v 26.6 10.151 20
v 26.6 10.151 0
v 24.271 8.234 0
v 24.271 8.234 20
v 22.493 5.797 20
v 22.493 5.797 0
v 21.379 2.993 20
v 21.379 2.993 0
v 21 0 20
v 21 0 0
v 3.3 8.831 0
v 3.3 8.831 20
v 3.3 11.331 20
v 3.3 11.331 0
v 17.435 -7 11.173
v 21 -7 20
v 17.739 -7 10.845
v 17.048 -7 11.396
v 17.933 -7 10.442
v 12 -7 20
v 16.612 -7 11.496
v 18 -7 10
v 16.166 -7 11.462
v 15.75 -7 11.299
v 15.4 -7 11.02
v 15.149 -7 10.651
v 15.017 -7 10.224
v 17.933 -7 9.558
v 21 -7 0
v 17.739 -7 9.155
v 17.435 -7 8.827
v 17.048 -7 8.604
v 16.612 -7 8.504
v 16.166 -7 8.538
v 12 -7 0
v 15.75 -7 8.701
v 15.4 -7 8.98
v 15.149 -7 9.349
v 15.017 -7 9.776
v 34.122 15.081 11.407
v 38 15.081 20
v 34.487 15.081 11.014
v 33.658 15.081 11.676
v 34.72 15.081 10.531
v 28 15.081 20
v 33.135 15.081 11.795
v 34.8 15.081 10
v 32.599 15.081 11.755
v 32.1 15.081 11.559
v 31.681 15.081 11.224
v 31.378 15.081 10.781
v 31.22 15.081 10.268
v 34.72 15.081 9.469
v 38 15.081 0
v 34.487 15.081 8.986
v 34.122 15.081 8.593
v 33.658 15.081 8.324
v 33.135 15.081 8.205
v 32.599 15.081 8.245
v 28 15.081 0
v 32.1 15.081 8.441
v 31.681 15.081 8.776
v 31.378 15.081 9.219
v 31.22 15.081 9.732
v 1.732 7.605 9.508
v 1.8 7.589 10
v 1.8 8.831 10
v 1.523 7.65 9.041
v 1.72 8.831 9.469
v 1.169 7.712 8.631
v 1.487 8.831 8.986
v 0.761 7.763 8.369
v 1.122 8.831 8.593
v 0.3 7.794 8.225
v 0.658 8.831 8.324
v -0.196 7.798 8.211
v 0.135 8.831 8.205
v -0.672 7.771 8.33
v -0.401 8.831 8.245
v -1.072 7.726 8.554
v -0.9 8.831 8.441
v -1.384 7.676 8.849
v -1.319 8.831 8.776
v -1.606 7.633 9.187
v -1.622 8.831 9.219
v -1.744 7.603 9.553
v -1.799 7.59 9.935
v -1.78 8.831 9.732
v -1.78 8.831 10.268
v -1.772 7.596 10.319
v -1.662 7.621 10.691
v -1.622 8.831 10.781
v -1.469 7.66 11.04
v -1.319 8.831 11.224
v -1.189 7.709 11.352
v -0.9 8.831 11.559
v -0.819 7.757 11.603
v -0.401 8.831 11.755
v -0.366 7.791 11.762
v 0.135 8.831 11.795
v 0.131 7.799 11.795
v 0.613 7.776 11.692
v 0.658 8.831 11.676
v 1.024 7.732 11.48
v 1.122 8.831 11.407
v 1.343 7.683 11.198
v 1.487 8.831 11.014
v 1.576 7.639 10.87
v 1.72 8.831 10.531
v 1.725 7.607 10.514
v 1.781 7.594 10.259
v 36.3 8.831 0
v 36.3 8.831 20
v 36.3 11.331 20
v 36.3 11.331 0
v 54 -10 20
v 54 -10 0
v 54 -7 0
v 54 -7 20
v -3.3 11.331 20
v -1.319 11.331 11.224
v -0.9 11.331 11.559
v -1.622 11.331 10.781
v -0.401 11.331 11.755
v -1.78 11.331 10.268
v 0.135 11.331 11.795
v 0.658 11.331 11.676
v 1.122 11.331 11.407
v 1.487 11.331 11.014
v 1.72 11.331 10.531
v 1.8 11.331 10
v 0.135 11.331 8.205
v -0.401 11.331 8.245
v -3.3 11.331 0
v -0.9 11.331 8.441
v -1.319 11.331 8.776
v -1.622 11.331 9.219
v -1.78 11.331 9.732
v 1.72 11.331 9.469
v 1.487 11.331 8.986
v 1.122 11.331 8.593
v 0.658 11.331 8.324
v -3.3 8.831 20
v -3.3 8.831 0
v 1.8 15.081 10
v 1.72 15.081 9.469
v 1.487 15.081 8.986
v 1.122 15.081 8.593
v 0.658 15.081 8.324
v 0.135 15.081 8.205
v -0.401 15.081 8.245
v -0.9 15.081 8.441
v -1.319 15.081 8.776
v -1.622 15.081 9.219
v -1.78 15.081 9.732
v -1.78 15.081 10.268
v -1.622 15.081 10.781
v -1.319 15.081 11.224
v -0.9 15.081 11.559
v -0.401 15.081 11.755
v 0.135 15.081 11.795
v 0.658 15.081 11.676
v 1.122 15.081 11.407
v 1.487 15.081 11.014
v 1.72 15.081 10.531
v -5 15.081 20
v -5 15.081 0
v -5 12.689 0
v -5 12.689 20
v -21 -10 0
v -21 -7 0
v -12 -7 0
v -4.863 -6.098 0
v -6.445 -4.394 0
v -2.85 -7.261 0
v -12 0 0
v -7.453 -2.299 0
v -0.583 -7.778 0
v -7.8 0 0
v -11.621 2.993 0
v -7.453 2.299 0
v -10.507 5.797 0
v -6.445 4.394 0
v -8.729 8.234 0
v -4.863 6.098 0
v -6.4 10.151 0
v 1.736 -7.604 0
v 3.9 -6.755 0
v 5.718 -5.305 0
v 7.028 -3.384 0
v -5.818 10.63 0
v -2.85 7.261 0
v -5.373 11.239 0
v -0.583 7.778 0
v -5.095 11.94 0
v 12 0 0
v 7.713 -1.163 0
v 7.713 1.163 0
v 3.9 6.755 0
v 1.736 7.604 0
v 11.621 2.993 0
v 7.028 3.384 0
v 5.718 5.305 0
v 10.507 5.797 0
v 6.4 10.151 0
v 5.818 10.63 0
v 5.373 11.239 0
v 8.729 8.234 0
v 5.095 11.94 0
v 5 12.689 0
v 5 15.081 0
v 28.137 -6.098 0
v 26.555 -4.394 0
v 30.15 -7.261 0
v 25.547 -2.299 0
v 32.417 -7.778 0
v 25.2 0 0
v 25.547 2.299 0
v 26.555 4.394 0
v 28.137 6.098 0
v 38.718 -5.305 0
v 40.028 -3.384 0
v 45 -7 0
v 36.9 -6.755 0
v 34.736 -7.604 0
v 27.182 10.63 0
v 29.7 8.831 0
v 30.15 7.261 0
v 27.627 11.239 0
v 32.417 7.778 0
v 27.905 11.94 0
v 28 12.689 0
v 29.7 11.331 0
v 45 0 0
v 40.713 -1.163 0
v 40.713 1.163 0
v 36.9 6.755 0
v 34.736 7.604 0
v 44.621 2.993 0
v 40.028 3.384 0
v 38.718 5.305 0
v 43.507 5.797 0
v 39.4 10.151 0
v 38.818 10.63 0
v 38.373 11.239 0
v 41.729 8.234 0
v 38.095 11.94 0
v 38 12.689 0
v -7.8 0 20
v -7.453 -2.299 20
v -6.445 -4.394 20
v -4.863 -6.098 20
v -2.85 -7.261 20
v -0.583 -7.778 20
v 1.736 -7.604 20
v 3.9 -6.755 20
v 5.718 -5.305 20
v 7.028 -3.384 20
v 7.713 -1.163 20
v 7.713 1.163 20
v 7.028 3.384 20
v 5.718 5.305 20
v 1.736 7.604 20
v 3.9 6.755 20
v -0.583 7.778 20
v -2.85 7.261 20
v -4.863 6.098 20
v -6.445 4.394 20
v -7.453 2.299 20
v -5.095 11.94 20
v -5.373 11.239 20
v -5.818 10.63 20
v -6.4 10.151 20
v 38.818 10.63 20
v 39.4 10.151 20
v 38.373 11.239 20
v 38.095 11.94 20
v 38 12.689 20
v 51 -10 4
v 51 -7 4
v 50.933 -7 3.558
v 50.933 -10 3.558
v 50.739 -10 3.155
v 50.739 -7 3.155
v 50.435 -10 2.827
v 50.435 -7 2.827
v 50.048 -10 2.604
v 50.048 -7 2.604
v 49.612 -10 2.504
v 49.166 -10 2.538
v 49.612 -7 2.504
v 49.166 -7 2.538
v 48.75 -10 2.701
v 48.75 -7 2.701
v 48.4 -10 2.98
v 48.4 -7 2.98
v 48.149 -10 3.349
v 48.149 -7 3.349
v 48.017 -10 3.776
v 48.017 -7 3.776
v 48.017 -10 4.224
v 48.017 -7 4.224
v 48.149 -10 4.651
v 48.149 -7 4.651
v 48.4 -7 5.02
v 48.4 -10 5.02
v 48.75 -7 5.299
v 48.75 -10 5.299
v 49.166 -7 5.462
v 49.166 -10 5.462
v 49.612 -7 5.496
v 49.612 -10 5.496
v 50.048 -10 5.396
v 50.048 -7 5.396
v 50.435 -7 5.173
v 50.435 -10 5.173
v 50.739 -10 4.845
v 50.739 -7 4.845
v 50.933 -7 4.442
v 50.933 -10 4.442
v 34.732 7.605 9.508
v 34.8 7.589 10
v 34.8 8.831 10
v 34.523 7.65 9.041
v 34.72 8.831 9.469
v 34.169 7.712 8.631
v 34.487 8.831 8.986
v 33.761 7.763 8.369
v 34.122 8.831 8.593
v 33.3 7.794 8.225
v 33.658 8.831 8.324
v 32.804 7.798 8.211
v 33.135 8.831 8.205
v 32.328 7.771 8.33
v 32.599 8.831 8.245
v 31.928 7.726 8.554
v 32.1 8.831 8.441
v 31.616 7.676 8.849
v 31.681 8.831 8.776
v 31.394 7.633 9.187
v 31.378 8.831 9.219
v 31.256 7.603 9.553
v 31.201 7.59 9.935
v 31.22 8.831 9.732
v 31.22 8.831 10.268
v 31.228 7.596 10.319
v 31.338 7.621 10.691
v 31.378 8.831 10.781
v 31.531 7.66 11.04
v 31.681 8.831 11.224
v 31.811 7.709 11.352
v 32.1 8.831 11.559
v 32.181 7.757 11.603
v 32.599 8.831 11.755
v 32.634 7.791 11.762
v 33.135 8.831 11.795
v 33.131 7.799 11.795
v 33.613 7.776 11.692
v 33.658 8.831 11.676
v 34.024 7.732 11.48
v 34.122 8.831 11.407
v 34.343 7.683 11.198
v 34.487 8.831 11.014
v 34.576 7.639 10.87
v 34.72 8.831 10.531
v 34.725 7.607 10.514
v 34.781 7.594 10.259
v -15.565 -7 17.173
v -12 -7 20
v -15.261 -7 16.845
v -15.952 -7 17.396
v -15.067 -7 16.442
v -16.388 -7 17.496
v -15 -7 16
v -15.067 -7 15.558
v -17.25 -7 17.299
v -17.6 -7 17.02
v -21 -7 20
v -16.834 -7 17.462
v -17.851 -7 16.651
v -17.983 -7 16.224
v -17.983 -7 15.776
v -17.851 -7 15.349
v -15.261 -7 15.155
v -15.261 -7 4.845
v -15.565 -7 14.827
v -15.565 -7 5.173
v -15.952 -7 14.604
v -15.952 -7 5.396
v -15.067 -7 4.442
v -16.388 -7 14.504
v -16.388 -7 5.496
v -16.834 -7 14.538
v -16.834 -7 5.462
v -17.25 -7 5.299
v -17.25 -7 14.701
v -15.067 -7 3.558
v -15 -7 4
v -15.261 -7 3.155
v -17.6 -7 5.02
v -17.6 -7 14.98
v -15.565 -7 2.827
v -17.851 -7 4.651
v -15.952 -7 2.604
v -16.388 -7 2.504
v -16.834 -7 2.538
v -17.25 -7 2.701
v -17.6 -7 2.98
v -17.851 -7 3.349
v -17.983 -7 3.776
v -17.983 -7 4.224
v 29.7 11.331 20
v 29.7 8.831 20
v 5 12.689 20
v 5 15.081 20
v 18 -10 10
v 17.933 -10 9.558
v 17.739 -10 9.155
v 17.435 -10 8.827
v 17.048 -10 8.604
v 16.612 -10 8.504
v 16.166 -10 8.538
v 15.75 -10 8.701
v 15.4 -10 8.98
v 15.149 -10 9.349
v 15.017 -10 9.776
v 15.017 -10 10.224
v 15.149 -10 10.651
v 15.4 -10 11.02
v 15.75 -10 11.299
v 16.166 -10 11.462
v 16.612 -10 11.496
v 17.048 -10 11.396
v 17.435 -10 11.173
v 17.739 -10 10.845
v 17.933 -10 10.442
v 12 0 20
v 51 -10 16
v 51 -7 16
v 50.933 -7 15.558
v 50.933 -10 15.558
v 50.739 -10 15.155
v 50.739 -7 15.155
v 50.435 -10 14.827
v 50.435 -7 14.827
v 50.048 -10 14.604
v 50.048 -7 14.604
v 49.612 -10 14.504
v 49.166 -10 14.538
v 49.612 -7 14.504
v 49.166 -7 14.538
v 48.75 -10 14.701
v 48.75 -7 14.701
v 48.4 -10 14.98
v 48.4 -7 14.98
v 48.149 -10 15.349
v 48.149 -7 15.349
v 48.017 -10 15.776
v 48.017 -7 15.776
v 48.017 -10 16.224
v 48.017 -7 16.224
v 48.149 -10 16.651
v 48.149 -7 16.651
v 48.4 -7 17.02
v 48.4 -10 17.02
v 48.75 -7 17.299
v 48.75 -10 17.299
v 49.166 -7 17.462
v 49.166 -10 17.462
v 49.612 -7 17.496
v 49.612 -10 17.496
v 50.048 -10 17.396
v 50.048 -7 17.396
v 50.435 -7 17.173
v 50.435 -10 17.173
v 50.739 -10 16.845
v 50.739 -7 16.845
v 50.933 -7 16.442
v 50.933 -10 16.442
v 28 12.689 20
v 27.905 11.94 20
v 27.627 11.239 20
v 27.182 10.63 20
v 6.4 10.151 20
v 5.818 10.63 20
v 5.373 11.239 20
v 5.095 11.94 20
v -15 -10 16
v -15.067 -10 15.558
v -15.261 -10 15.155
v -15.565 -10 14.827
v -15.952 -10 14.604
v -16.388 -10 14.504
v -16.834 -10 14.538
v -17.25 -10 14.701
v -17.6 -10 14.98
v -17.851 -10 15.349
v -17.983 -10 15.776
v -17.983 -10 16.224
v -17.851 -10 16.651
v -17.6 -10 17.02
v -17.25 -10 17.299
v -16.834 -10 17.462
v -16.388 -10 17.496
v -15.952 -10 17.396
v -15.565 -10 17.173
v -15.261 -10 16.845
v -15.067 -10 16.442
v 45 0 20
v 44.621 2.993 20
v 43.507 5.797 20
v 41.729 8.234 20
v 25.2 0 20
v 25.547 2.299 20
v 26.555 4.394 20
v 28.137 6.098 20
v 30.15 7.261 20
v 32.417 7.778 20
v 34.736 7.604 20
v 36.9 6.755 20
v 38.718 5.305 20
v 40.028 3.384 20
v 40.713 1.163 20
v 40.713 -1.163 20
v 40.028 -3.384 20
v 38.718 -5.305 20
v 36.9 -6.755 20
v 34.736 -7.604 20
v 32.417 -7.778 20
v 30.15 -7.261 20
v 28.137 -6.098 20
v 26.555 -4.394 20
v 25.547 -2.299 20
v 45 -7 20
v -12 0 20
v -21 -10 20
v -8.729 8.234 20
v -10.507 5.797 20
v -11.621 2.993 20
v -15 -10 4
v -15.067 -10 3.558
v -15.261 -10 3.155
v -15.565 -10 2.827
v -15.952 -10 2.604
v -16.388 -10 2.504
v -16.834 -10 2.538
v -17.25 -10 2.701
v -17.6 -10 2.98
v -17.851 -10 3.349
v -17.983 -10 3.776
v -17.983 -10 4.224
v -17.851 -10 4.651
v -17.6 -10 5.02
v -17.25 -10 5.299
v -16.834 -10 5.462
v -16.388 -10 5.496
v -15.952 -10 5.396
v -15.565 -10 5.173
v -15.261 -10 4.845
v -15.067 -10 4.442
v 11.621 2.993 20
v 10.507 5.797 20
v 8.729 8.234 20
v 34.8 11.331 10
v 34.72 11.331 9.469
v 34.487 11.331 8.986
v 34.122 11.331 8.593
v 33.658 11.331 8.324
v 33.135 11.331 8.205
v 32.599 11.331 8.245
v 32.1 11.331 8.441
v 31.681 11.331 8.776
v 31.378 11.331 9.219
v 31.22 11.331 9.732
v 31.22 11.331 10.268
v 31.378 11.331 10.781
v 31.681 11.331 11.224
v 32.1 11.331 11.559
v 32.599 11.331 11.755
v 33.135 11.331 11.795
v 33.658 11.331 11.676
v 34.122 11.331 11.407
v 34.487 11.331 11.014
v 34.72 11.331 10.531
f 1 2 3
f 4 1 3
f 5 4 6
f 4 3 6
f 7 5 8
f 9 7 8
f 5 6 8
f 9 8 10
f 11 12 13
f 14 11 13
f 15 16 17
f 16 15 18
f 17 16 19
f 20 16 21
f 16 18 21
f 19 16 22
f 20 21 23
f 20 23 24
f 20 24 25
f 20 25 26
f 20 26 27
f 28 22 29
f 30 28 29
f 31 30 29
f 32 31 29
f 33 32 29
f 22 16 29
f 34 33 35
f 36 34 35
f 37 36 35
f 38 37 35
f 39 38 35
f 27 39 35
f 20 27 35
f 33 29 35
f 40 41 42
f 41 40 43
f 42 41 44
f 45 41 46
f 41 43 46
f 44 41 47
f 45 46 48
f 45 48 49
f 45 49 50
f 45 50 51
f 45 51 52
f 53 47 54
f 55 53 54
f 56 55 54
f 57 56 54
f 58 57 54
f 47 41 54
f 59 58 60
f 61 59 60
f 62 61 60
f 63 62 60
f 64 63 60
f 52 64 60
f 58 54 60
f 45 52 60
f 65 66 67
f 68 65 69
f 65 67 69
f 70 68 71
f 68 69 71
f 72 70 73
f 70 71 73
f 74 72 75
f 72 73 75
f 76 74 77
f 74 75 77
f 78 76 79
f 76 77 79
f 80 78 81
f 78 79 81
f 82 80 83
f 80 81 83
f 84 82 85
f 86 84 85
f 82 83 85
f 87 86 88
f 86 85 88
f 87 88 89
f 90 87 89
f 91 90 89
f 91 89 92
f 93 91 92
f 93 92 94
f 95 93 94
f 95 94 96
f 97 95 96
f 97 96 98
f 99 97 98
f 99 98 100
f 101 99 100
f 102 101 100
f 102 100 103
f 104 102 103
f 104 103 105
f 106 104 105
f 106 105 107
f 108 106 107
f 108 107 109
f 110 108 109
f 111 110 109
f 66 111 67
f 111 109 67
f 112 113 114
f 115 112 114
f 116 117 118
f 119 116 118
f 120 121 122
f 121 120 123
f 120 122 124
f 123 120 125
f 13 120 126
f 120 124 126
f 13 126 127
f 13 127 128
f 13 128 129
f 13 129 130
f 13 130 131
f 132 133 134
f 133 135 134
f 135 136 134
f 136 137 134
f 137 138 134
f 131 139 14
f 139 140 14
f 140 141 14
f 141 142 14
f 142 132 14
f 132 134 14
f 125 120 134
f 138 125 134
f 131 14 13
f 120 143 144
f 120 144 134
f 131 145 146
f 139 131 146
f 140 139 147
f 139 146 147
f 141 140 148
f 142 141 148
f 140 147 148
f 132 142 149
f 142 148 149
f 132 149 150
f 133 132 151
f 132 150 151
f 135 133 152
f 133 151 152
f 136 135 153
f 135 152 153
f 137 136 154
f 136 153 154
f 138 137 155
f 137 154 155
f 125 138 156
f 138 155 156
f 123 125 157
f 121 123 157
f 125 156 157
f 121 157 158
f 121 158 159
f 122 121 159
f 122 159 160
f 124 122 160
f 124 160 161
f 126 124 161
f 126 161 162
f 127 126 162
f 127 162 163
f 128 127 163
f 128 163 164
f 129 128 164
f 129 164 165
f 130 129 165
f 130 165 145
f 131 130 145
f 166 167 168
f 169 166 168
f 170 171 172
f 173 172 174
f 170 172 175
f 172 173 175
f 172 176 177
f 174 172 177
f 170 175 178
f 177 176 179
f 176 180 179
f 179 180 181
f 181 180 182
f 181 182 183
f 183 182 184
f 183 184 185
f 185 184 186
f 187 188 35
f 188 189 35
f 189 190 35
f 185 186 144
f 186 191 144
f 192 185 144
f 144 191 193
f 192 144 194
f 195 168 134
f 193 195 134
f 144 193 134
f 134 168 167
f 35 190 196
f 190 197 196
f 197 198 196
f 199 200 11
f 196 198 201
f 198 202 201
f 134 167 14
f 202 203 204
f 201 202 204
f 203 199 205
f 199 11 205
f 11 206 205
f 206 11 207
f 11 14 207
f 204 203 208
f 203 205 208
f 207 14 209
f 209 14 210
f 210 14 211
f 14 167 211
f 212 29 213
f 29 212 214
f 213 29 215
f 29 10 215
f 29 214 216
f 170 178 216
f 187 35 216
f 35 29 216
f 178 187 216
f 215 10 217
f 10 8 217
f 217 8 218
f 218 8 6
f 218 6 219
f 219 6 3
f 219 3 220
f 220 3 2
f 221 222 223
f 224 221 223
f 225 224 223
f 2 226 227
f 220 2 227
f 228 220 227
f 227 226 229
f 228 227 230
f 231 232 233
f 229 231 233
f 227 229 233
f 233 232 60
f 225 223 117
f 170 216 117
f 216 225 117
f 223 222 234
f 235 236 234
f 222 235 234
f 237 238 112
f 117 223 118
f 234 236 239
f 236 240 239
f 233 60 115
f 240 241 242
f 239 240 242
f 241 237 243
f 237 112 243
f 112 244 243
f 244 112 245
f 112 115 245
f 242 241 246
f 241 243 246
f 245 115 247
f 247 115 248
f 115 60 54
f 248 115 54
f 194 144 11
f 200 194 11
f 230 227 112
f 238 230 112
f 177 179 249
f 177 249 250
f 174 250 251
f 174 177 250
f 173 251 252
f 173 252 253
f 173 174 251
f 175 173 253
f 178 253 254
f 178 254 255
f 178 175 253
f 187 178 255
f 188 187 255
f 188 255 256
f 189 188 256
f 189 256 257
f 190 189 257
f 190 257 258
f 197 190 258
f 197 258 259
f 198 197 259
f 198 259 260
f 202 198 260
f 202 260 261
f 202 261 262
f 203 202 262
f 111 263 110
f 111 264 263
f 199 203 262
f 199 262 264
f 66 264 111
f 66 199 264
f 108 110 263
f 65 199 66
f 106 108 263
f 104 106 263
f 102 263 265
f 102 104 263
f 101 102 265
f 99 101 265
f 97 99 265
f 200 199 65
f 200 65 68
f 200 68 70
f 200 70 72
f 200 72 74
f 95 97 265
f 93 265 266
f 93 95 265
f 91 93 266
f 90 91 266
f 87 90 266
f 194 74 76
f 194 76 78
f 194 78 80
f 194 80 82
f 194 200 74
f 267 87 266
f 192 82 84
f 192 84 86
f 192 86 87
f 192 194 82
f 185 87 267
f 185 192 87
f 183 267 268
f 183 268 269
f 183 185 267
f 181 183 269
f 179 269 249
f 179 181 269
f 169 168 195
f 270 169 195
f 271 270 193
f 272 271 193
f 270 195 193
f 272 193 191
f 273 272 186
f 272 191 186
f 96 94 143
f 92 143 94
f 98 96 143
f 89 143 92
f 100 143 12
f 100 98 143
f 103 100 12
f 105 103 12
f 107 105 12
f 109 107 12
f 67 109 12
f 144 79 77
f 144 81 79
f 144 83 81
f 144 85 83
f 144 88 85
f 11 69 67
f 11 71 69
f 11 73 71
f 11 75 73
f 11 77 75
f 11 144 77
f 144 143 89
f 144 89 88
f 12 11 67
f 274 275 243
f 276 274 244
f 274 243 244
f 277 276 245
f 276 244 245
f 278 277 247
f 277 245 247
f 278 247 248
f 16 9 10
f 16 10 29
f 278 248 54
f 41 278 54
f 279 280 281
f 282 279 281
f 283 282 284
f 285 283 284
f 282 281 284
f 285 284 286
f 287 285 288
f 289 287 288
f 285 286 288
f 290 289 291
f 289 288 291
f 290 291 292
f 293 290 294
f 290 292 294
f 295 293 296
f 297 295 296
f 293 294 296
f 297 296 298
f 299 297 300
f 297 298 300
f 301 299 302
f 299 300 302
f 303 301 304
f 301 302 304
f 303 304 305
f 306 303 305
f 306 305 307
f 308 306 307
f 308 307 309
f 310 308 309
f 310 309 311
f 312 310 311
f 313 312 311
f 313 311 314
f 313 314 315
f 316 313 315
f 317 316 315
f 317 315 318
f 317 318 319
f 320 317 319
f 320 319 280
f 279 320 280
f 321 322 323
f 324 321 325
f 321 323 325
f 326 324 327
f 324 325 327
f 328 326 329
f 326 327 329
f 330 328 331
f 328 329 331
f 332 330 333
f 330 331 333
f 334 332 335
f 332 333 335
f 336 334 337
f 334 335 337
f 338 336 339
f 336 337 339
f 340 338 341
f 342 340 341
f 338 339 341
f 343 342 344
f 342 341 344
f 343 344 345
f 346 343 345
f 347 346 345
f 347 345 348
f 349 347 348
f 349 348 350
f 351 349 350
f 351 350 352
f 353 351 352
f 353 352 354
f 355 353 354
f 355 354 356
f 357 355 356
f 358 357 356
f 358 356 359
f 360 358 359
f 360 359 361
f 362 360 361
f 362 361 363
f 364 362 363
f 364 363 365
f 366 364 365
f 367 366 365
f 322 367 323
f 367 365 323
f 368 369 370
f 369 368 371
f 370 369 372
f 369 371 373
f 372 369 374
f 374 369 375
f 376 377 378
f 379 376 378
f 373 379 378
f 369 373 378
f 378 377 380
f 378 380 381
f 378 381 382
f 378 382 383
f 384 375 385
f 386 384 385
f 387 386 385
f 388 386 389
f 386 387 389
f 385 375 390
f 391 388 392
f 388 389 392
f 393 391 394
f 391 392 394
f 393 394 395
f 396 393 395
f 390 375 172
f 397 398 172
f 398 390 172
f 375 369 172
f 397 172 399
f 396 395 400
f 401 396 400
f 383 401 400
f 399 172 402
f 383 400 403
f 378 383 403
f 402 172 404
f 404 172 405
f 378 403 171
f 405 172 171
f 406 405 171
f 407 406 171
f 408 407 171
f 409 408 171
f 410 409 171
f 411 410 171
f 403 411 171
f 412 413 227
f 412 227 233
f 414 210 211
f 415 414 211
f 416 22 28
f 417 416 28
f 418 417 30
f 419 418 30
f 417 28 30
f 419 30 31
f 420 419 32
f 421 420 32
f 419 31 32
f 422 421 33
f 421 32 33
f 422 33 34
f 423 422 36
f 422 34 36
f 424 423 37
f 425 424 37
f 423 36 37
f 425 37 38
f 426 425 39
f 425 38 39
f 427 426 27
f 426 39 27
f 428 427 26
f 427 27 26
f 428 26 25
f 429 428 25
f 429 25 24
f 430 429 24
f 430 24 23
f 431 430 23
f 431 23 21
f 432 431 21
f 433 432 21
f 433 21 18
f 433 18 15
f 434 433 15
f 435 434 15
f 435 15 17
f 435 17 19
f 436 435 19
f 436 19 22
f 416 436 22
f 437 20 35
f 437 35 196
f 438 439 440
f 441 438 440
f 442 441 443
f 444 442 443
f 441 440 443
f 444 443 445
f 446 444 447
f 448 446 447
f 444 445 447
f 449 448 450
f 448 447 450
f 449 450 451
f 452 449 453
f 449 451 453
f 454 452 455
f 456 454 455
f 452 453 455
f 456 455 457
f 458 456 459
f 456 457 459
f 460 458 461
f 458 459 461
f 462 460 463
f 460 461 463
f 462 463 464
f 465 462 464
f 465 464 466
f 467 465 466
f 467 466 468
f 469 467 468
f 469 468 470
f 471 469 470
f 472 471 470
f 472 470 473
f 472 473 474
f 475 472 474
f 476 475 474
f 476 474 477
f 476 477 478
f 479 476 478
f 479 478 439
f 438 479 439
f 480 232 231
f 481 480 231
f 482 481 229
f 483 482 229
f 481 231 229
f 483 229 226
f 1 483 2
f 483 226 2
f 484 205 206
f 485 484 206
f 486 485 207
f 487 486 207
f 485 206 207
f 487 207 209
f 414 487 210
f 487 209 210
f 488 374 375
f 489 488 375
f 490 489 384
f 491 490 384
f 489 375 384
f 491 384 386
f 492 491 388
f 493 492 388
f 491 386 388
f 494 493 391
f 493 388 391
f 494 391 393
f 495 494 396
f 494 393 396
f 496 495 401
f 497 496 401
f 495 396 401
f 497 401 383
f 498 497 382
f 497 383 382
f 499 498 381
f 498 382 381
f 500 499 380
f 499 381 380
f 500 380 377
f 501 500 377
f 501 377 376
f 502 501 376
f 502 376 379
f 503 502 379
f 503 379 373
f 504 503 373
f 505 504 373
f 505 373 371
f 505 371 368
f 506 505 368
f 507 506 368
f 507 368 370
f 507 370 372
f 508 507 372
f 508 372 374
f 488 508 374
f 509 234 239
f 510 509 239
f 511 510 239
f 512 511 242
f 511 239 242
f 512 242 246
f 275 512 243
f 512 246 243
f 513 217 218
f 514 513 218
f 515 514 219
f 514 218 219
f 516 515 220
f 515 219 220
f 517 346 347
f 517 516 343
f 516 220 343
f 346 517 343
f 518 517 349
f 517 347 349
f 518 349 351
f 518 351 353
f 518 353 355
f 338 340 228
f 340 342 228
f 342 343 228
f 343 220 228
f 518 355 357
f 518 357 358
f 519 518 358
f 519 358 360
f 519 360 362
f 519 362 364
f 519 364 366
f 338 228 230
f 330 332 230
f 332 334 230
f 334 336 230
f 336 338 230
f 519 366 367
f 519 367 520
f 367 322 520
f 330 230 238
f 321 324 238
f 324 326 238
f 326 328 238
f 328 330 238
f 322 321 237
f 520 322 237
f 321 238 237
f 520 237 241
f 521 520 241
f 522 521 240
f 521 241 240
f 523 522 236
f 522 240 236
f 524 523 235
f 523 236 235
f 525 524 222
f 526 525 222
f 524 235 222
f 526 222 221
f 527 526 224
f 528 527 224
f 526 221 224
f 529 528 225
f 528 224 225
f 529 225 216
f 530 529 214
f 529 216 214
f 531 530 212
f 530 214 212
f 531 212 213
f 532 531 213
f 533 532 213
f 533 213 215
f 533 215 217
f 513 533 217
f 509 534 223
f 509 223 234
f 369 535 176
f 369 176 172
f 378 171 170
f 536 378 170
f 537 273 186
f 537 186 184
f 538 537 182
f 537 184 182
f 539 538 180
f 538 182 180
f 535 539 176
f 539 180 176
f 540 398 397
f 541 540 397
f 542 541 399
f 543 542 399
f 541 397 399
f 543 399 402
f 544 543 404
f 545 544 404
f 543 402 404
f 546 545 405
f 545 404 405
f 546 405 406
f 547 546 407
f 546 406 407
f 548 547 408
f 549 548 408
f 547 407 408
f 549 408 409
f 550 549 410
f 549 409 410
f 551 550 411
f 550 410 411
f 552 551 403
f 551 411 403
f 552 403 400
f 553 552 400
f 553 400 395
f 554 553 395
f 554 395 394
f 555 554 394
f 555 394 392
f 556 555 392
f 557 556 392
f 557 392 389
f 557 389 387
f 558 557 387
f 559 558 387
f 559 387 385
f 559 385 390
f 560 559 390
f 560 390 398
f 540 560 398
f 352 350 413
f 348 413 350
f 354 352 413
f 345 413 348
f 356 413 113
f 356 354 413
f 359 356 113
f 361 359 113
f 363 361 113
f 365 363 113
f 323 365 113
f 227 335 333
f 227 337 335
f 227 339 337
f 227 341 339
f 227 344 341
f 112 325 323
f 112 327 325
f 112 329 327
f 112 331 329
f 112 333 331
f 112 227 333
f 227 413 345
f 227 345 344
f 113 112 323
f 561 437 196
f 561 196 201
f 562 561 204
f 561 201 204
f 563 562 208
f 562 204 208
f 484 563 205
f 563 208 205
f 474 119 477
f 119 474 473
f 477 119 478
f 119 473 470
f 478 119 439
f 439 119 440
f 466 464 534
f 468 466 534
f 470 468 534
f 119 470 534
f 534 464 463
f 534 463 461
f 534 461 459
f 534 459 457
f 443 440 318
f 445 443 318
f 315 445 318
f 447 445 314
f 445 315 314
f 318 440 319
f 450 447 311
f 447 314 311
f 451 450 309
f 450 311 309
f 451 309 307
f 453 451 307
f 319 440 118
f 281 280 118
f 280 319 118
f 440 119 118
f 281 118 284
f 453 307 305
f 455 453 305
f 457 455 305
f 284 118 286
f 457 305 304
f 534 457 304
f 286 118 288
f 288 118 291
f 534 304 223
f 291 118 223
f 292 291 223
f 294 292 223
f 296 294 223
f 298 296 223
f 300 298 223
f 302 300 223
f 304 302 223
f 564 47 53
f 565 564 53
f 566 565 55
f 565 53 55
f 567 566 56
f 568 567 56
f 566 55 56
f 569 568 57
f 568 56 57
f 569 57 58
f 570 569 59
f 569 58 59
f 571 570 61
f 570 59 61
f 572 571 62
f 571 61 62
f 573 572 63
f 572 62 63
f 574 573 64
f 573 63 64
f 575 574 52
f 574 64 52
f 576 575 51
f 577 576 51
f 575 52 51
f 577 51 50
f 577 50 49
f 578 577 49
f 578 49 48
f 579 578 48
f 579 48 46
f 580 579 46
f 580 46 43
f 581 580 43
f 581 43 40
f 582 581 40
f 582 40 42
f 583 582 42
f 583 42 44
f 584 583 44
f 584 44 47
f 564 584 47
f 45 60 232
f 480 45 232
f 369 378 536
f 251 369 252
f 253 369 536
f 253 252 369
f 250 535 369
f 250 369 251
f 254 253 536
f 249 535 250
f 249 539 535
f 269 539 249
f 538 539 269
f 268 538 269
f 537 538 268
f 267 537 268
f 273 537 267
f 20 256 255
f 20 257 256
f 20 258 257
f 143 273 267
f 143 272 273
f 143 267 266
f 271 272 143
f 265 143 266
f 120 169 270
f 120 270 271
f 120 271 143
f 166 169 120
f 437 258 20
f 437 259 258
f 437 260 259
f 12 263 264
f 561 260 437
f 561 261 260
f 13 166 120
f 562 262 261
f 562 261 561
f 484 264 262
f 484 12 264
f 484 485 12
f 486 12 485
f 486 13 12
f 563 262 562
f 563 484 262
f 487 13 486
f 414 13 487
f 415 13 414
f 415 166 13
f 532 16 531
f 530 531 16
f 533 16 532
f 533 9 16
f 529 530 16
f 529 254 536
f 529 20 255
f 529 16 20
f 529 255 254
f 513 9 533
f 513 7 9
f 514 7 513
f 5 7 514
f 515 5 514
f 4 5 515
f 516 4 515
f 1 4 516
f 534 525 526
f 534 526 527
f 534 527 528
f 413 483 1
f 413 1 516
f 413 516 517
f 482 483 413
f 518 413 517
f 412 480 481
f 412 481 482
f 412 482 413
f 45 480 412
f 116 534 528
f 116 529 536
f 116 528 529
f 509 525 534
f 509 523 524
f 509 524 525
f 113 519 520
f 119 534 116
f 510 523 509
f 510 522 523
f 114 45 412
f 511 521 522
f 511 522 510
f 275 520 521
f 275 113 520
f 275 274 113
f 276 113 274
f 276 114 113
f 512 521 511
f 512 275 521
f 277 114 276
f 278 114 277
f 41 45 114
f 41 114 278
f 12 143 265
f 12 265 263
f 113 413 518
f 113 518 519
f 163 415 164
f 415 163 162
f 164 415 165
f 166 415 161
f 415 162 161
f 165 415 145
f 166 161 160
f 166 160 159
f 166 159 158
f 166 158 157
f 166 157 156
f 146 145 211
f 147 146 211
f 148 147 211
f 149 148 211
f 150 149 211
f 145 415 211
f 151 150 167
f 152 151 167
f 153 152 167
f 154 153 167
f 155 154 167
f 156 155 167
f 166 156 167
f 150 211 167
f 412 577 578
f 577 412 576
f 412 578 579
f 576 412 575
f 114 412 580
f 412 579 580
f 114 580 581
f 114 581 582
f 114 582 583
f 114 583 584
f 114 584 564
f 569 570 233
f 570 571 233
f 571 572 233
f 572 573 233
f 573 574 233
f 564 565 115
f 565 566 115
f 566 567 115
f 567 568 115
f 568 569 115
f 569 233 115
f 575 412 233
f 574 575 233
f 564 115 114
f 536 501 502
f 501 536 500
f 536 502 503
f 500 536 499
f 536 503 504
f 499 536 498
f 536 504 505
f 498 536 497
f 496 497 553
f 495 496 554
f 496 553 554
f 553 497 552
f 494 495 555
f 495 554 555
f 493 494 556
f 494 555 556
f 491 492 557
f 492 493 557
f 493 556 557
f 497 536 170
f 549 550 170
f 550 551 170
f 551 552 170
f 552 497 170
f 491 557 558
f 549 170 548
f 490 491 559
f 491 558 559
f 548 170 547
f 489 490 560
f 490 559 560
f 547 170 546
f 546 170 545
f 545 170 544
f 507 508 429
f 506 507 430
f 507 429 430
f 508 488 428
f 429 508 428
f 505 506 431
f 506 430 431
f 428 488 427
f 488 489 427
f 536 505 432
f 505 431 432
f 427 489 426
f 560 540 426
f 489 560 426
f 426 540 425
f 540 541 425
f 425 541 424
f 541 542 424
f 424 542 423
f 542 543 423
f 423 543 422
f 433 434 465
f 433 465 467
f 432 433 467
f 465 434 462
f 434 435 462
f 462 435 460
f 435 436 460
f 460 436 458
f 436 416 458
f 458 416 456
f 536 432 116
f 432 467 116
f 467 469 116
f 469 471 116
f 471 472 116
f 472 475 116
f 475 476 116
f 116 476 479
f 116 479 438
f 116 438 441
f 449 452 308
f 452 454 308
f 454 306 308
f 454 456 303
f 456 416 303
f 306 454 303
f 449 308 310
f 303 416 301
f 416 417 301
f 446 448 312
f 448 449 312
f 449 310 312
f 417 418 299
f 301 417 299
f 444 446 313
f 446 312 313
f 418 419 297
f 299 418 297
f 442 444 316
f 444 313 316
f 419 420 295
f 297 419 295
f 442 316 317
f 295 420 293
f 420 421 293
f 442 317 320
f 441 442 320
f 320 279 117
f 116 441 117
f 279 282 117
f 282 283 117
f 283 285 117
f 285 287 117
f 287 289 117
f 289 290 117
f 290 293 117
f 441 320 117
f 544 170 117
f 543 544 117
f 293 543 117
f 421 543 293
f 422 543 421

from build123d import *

# Parameters (mm, degrees)
ESBO_O1_W                = 6.6
ESBO_O1_H                = 2.5
RESSALTO_EXTRUS_O1_DEPTH = 20
ESBO_O2_R                = 1.5
CORTE_EXTRUS_O1_DEPTH    = 26
ESBO_O4_R                = 1.8
CORTE_EXTRUS_O2_DEPTH    = 16


with BuildPart() as part:
    # Esboço1 → Ressalto-extrusão1 (new body)
    with BuildSketch(Plane.XY):
        with BuildLine():
            Line((-12, 0), (-12, -7))
            Line((-12, -7), (-21, -7))
            Line((-21, -7), (-21, -10))
            Line((-21, -10), (54, -10))
            Line((54, -10), (54, -7))
            Line((54, -7), (45, -7))
            Line((45, -7), (45, 0))
            ThreePointArc((45, 0), (43.507140429, 5.796550698), (39.4, 10.150862032))
            ThreePointArc((39.4, 10.150862032), (38.373214893, 11.239439866), (38, 12.68857754))
            Line((38, 12.68857754), (38, 15.080826084))
            Line((38, 15.080826084), (28, 15.080826084))
            Line((28, 15.080826084), (28, 12.68857754))
            ThreePointArc((28, 12.68857754), (27.626785107, 11.239439866), (26.6, 10.150862032))
            ThreePointArc((26.6, 10.150862032), (22.492859571, 5.796550698), (21, 0))
            Line((21, 0), (21, -7))
            Line((21, -7), (12, -7))
            Line((12, -7), (12, 0))
            ThreePointArc((12, 0), (10.507140429, 5.796550698), (6.4, 10.150862032))
            ThreePointArc((6.4, 10.150862032), (5.373214893, 11.239439866), (5, 12.68857754))
            Line((5, 12.68857754), (5, 15.080826084))
            Line((5, 15.080826084), (-5, 15.080826084))
            Line((-5, 15.080826084), (-5, 12.68857754))
            ThreePointArc((-5, 12.68857754), (-5.373214893, 11.239439866), (-6.4, 10.150862032))
            ThreePointArc((-6.4, 10.150862032), (-10.507140429, 5.796550698), (-12, 0))
        make_face()
        with Locations((0, 10.080826084)):
            Rectangle(ESBO_O1_W, ESBO_O1_H, mode=Mode.SUBTRACT)
        with Locations((33, 10.080826084)):
            Rectangle(ESBO_O1_W, ESBO_O1_H, mode=Mode.SUBTRACT)
        with BuildLine():
            ThreePointArc((7.8, 0), (0, 7.8), (-7.8, 0))
            ThreePointArc((-7.8, 0), (0, -7.8), (7.8, 0))
        make_face(mode=Mode.SUBTRACT)
        with BuildLine():
            ThreePointArc((40.8, 0), (33, -7.8), (25.2, 0))
            ThreePointArc((25.2, 0), (33, 7.8), (40.8, 0))
        make_face(mode=Mode.SUBTRACT)
    extrude(amount=RESSALTO_EXTRUS_O1_DEPTH)

    # Esboço2 → Corte-extrusão1 (cut)
    with BuildSketch(Plane(origin=(0, -7, 0), x_dir=(1, 0, 0), z_dir=(0, 1, 0))):
        with Locations((-16.5, -4)):
            Circle(ESBO_O2_R)
        with Locations((-16.5, -16)):
            Circle(ESBO_O2_R)
        with Locations((49.5, -16)):
            Circle(ESBO_O2_R)
        with Locations((49.5, -4)):
            Circle(ESBO_O2_R)
        with Locations((16.5, -10)):
            Circle(ESBO_O2_R)
    extrude(amount=-CORTE_EXTRUS_O1_DEPTH, mode=Mode.SUBTRACT)

    # Esboço4 → Corte-extrusão2 (cut)
    with BuildSketch(Plane(origin=(0, 15.080826084, 0), x_dir=(1, 0, 0), z_dir=(0, 1, 0))):
        with Locations((0, -10)):
            Circle(ESBO_O4_R)
        with Locations((33, -10)):
            Circle(ESBO_O4_R)
    extrude(amount=-CORTE_EXTRUS_O2_DEPTH, mode=Mode.SUBTRACT)


solid = part.part
